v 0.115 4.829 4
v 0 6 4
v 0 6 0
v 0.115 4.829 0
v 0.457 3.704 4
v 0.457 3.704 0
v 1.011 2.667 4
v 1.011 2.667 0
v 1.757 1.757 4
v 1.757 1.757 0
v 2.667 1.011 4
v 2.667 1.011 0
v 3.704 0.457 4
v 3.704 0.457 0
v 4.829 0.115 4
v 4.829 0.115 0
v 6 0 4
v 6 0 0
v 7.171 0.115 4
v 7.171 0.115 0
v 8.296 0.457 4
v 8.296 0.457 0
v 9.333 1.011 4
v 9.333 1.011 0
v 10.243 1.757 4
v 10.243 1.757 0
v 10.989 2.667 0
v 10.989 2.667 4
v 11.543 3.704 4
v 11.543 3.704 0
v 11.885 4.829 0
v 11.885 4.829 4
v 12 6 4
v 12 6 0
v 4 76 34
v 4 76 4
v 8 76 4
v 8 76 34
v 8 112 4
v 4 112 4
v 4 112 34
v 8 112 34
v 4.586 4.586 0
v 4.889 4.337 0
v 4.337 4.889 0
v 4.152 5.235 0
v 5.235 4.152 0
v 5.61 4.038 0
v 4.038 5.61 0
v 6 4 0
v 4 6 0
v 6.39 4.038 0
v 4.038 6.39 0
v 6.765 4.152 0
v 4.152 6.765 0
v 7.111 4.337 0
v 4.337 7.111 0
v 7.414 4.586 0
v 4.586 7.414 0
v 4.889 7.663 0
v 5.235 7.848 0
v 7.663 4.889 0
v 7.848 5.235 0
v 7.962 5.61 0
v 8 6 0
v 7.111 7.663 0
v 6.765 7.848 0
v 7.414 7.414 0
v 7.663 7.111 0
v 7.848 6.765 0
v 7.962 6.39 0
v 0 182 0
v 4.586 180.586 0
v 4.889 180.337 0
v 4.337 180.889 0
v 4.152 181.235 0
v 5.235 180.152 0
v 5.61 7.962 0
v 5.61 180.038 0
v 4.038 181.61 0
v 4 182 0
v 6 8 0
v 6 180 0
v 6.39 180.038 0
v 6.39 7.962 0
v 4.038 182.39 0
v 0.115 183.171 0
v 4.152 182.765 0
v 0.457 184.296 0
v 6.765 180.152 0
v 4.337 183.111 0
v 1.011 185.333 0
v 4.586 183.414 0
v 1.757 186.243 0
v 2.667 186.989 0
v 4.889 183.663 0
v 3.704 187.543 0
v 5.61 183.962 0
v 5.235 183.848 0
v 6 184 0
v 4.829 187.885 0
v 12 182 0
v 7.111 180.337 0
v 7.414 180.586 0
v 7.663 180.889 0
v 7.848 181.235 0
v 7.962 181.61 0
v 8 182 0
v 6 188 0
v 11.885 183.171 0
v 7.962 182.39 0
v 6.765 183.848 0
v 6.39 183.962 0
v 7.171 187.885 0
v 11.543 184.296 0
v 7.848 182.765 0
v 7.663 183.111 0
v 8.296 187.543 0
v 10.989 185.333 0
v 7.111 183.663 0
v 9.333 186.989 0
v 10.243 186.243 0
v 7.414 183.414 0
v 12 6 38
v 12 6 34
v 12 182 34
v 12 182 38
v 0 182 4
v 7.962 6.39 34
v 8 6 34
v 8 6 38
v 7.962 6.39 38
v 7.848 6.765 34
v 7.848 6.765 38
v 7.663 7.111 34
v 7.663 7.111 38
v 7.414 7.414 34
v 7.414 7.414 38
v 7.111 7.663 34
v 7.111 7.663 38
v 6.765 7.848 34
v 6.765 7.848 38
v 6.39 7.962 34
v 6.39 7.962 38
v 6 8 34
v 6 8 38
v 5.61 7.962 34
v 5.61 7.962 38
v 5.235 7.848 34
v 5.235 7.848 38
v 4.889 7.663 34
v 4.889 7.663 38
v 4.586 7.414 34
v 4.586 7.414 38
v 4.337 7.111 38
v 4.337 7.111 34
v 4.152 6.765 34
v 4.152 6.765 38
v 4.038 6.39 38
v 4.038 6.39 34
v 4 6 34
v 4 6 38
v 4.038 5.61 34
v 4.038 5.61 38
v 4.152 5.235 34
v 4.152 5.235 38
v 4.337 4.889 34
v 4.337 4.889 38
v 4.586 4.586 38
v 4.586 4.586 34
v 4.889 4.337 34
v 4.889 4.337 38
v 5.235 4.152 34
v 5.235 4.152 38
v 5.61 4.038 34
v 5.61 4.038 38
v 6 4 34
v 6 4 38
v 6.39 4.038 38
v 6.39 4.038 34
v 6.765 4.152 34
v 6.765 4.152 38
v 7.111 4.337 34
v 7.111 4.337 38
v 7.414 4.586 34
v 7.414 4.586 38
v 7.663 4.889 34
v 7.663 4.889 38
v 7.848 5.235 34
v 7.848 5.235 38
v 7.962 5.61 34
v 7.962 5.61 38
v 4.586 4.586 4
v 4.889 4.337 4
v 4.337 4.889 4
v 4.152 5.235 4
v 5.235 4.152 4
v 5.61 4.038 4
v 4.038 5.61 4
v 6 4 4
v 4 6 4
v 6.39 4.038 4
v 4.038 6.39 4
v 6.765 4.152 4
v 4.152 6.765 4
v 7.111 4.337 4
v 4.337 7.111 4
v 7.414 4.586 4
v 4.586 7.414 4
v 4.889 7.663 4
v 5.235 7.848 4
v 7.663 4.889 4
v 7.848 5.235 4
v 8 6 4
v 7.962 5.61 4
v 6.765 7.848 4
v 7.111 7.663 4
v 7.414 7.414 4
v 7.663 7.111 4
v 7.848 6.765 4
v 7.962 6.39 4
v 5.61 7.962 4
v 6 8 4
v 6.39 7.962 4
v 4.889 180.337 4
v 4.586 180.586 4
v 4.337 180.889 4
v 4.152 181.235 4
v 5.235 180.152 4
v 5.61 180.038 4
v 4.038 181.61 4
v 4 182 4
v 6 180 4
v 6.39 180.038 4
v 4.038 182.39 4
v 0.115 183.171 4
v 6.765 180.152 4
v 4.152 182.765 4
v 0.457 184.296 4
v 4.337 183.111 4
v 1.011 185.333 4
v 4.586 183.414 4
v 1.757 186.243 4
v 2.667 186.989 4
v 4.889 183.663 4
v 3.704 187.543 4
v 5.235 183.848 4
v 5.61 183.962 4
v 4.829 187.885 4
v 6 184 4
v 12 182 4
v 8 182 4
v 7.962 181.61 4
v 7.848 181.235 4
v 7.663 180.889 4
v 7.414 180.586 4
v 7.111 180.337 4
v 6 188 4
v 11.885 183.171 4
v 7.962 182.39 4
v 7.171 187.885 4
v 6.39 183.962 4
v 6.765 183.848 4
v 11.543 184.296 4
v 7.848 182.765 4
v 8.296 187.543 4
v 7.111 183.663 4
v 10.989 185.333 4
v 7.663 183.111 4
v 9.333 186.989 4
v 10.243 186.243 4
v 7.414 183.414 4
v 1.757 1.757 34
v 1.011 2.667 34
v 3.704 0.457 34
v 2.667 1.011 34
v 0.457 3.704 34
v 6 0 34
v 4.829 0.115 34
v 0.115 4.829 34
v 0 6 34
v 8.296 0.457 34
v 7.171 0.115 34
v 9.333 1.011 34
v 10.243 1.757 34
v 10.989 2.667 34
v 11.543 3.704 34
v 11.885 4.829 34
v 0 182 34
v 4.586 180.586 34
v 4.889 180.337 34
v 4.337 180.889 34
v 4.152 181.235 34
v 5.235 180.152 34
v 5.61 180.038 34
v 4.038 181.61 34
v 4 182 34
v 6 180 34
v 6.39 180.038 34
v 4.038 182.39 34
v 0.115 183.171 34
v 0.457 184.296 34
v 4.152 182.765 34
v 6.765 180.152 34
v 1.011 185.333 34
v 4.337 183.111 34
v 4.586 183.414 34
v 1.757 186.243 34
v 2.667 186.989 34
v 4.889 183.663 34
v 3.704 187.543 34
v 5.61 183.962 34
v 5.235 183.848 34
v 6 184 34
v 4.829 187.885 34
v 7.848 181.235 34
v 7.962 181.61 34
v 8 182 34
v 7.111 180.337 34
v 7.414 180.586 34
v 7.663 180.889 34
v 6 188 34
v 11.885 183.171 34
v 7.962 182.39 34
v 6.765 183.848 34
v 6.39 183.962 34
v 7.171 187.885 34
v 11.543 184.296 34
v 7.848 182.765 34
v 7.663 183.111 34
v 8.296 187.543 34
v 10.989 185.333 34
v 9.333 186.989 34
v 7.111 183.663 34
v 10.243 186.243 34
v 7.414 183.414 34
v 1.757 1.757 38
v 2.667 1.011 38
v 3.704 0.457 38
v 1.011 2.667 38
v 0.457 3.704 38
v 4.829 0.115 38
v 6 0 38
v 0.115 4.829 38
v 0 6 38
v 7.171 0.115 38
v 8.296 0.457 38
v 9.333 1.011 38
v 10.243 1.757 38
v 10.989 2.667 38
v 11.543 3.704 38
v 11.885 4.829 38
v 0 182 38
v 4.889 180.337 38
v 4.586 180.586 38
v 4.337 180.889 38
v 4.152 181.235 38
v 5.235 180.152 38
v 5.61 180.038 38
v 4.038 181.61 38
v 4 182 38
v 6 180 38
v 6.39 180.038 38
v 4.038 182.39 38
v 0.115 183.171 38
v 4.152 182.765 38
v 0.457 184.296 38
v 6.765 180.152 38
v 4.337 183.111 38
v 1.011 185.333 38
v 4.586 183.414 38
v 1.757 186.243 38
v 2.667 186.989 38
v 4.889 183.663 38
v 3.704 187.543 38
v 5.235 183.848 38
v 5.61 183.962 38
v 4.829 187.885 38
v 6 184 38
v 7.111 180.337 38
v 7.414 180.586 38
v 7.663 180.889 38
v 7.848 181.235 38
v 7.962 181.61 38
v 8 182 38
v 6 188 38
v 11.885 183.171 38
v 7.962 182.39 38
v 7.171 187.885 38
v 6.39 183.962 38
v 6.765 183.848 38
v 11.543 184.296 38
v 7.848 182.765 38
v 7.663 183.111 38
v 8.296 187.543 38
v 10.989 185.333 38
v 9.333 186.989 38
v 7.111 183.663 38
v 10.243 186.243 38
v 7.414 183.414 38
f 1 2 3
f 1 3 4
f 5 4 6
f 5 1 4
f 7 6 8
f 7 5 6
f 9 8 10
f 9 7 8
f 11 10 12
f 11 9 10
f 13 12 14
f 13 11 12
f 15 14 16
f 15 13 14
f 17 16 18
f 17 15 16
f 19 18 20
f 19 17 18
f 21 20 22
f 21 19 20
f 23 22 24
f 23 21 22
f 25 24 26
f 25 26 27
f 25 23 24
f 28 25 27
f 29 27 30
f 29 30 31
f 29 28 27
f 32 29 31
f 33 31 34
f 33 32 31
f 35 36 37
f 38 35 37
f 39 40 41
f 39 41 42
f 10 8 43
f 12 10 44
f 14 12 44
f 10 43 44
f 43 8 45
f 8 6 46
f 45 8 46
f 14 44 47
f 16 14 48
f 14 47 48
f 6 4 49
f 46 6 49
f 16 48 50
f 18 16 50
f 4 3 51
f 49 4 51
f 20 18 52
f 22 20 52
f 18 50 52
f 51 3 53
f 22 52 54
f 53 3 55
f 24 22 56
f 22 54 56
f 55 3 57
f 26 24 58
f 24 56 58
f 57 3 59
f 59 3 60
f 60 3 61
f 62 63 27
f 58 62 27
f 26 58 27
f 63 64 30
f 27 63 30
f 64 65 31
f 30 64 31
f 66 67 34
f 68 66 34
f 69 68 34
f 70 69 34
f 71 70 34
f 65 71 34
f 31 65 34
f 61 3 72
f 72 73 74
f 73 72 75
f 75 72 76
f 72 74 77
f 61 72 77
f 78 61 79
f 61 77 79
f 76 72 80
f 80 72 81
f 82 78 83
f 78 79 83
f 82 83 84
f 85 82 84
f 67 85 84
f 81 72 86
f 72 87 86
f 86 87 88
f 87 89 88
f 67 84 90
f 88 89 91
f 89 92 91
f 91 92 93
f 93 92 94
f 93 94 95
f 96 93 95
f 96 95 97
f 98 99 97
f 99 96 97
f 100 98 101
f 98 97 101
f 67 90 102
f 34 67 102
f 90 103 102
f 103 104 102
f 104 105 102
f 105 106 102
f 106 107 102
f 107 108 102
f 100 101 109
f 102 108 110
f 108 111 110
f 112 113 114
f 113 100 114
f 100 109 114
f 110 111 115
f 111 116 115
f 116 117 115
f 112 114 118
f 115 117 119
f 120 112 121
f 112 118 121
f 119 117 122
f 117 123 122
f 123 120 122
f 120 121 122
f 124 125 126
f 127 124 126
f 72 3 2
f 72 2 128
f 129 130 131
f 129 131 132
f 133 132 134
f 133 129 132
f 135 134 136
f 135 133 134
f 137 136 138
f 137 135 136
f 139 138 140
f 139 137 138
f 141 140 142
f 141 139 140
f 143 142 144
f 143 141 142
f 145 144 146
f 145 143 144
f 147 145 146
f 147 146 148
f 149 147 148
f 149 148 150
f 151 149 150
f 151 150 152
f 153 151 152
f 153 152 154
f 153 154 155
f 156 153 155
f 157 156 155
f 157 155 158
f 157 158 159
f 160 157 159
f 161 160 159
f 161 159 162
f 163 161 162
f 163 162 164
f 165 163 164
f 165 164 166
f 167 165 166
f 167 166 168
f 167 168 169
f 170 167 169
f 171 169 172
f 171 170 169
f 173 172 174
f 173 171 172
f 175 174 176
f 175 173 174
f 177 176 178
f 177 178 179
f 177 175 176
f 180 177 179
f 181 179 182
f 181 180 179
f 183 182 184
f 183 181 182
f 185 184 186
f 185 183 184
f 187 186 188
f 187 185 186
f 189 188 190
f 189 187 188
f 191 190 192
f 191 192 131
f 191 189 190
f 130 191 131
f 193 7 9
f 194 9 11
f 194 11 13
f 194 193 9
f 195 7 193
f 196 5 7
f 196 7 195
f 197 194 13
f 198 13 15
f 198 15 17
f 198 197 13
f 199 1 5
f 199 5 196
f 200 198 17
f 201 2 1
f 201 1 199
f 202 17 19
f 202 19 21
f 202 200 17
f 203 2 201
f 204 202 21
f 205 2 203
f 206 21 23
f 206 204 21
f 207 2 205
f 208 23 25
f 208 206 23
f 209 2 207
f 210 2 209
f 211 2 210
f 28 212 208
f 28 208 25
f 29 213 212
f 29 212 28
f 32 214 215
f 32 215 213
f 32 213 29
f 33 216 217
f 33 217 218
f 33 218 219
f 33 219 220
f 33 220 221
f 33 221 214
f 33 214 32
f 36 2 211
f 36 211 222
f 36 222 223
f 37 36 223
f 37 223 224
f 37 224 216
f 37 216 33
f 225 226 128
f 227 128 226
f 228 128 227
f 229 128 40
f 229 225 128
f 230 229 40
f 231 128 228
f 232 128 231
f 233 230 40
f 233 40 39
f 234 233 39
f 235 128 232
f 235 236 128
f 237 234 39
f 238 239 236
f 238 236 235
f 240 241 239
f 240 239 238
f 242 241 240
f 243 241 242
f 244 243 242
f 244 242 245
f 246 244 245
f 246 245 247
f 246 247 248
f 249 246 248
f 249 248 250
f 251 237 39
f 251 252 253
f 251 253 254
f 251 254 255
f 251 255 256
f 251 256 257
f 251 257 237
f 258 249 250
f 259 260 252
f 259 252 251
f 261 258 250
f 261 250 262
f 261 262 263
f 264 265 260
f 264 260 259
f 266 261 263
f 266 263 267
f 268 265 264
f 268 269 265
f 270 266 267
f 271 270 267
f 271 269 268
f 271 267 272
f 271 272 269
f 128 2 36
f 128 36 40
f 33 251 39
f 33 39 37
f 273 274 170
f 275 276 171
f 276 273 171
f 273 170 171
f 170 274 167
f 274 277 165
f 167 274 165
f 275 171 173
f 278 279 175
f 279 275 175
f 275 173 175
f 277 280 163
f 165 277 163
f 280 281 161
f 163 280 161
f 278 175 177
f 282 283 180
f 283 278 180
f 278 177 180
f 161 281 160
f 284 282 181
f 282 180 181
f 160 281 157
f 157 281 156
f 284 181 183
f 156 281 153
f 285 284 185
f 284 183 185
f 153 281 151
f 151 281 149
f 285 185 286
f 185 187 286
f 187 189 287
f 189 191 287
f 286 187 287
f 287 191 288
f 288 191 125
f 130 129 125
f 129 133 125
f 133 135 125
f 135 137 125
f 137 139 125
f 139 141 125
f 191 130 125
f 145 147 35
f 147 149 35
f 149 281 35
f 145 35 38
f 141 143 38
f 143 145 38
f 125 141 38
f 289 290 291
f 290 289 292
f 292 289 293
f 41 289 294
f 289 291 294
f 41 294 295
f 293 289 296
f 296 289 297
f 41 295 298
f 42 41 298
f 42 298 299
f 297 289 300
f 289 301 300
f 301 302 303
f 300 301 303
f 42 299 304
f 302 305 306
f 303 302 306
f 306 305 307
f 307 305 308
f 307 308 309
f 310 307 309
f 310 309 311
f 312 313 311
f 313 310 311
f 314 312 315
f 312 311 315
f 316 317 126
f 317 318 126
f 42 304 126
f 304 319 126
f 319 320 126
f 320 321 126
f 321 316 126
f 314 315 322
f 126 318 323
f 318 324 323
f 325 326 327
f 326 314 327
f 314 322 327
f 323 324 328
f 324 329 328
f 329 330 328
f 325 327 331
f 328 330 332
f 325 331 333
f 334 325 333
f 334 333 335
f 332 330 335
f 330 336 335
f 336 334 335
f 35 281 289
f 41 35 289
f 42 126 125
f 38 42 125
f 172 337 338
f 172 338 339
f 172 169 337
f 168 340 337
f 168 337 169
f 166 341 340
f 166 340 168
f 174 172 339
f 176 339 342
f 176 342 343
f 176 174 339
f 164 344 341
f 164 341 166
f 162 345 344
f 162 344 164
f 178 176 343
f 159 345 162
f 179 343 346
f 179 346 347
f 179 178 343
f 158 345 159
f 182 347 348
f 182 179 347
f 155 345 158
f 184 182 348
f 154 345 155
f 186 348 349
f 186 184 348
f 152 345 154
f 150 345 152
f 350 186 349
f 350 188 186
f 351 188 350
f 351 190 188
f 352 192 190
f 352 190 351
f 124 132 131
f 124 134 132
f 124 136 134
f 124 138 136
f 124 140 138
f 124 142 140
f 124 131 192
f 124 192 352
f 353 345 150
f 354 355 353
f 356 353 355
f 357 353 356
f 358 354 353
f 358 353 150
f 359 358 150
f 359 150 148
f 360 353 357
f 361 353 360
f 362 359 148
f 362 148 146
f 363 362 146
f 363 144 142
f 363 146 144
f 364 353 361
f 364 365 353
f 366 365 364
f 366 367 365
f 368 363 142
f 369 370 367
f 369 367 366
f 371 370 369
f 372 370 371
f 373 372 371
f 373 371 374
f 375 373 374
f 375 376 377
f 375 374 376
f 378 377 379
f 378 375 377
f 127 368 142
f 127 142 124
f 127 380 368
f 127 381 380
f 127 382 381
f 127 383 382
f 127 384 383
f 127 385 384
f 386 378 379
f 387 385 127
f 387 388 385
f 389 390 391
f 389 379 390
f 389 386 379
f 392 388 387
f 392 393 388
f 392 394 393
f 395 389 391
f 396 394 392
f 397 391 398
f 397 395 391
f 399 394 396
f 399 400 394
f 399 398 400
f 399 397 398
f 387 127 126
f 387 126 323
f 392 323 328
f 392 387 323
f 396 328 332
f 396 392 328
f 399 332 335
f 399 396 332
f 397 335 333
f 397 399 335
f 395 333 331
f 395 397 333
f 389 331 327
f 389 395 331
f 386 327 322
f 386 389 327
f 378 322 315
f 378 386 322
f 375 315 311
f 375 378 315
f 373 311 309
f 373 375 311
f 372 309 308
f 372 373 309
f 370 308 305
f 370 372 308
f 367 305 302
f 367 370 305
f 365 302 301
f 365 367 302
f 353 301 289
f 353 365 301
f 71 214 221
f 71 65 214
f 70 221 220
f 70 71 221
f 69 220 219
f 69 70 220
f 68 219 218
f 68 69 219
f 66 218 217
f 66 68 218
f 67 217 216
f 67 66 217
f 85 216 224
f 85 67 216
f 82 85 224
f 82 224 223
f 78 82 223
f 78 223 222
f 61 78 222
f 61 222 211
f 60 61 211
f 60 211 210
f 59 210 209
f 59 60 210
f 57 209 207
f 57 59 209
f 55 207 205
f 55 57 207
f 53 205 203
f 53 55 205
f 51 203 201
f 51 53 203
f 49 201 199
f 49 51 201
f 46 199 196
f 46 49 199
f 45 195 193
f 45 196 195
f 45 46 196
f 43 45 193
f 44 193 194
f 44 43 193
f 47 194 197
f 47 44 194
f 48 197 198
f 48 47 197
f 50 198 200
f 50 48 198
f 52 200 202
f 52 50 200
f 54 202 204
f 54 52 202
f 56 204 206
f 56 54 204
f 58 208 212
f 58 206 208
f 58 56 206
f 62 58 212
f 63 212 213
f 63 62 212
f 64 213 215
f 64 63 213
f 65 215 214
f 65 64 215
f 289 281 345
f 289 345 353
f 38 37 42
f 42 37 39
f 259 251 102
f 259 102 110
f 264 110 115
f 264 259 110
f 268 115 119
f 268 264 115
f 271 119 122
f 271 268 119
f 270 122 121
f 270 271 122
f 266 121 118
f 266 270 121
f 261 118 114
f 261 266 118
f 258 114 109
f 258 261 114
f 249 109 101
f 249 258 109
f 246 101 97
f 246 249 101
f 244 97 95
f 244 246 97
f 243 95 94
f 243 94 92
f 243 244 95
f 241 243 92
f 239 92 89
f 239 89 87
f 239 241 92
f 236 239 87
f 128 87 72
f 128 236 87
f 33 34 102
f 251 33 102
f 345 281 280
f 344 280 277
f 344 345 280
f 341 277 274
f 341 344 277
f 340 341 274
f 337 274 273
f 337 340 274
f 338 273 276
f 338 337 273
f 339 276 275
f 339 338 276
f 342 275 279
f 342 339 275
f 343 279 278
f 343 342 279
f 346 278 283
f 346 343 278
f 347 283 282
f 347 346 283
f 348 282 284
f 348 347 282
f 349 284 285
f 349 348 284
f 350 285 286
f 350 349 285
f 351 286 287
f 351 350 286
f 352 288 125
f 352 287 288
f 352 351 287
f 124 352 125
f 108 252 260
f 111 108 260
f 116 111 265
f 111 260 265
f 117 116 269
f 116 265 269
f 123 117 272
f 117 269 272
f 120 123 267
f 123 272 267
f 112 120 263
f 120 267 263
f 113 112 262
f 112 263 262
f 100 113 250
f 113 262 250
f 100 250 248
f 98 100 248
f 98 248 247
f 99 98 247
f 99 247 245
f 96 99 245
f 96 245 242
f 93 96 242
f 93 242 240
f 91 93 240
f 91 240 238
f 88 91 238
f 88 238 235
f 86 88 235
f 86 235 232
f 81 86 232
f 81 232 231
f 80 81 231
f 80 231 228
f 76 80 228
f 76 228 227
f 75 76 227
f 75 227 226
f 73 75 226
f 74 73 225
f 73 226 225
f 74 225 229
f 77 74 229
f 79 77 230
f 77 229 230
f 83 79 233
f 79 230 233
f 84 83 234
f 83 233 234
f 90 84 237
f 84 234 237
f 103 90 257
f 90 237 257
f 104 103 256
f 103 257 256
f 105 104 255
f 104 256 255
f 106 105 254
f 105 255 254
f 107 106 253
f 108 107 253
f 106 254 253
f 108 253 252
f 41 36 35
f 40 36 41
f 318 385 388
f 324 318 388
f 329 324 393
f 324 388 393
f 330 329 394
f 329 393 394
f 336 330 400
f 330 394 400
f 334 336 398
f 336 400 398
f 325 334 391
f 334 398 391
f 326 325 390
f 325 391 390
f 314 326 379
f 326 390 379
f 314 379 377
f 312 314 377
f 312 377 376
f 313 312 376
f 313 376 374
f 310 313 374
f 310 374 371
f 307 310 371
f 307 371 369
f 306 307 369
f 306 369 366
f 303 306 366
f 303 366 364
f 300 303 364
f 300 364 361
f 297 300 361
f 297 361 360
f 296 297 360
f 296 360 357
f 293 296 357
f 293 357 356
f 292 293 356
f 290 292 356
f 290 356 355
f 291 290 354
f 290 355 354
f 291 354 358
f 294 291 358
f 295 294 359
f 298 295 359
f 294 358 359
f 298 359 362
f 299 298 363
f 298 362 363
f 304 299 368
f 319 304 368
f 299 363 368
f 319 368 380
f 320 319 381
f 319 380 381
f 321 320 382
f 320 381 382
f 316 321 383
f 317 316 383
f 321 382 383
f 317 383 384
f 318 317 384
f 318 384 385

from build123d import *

# Parameters (mm, degrees)
ESQUISSE1_W             = 12
ESQUISSE1_H             = 188
BOSS_EXTRU_1_DEPTH      = 4
ESQUISSE2_R             = 2
BOSS_EXTRU_2_DEPTH      = 30
ESQUISSE3_W             = 12
ESQUISSE3_H             = 188
BOSS_EXTRU_3_DEPTH      = 4
ENL_V_MAT_EXTRU_1_DEPTH = 74
ENL_V_MAT_EXTRU_2_DEPTH = 74
ENL_V_START             = -74
ESQUISSE6_R             = 2
ENL_V_MAT_EXTRU_3_DEPTH = 74
ESQUISSE8_W             = 4
ESQUISSE8_H             = 36
BOSS_EXTRU_4_DEPTH      = 30
ESQUISSE7_R             = 2
ENL_V_MAT_EXTRU_6_DEPTH = 193.177001746


with BuildPart() as part:
    # Esquisse1 → Boss.-Extru.1 (new body)
    with BuildSketch(Plane.XY):
        with Locations((6, 94)):
            Rectangle(ESQUISSE1_W, ESQUISSE1_H)
    extrude(amount=BOSS_EXTRU_1_DEPTH)

    # Esquisse2 → Boss.-Extru.2 (add)
    with BuildSketch(Plane.XY.offset(4)):
        with Locations(Location((6, 182, 0), (0, 0, 180))):
            Circle(ESQUISSE2_R)
        with Locations(Location((6, 6, 0), (0, 0, 180))):
            Circle(ESQUISSE2_R)
    extrude(amount=BOSS_EXTRU_2_DEPTH)

    # Esquisse3 → Boss.-Extru.3 (add)
    with BuildSketch(Plane.XY.offset(34)):
        with Locations((6, 94)):
            Rectangle(ESQUISSE3_W, ESQUISSE3_H)
    extrude(amount=BOSS_EXTRU_3_DEPTH)

    # Esquisse4 → Enlèv. mat.-Extru.1 (cut)
    with BuildSketch(Plane.XY.offset(38)):
        with BuildLine():
            Line((0, 182), (0, 193.947131368))
            Line((0, 193.947131368), (12, 193.947131368))
            Line((12, 193.947131368), (12, 182))
            ThreePointArc((12, 182), (6, 188), (0, 182))
        make_face()
    extrude(amount=-ENL_V_MAT_EXTRU_1_DEPTH, mode=Mode.SUBTRACT)

    # Esquisse5 → Enlèv. mat.-Extru.2 (cut)
    with BuildSketch(Plane.XY.offset(38)):
        with BuildLine():
            Line((12, 6), (12, -5.88895182))
            Line((12, -5.88895182), (0, -5.88895182))
            Line((0, -5.88895182), (0, 6))
            ThreePointArc((0, 6), (6, 0), (12, 6))
        make_face()
    extrude(amount=-ENL_V_MAT_EXTRU_2_DEPTH, mode=Mode.SUBTRACT)

    # Esquisse6 → Enlèv. mat.-Extru.3 (cut)
    with BuildSketch(Plane.XY.offset(38).offset(ENL_V_START)):
        with Locations((6, 6)):
            Circle(ESQUISSE6_R)
    extrude(amount=ENL_V_MAT_EXTRU_3_DEPTH, mode=Mode.SUBTRACT)

    # Esquisse8 → Boss.-Extru.4 (add)
    with BuildSketch(Plane.XY.offset(4)):
        with Locations((6, 94)):
            Rectangle(ESQUISSE8_W, ESQUISSE8_H)
    extrude(amount=BOSS_EXTRU_4_DEPTH)

    # Esquisse7 → Enlèv. mat.-Extru.6 (cut, through all)
    with BuildSketch(Plane.XY.offset(38)):
        with Locations((6, 182)):
            Circle(ESQUISSE7_R)
    extrude(amount=-ENL_V_MAT_EXTRU_6_DEPTH, mode=Mode.SUBTRACT)


solid = part.part
